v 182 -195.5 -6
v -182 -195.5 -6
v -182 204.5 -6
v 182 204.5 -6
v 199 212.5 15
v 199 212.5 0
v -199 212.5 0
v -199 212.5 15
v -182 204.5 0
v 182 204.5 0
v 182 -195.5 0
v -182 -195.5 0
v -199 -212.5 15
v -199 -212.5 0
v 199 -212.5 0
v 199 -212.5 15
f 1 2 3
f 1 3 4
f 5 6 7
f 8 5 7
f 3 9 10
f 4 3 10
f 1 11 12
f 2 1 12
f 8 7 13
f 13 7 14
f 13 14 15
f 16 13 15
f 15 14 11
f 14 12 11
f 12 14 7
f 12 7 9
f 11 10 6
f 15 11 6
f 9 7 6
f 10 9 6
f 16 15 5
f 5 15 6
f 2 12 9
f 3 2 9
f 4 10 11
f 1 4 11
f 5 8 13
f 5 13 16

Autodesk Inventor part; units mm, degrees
ref_plane "YZ Plane" through (0, 0, 0) normal (1, 0, 0) x (0, 1, 0)
ref_plane "XZ Plane" through (0, 0, 0) normal (0, 1, 0) x (-1, 0, 0)
ref_plane "XY Plane" through (0, 0, 0) normal (0, 0, 1) x (1, 0, 0)
sketch "Skizze1" plane through (0, 0, 0) normal (0, 0, 1) x (1, 0, 0)
  line L0 (-199, -212.5) -> (199, -212.5)
  line L1 (199, -212.5) -> (199, 212.5)
  line L2 (199, 212.5) -> (-199, 212.5)
  line L3 (-199, 212.5) -> (-199, -212.5)
  line L4 (-199, -212.5) -> (199, 212.5) construction
  line L5 (199, -212.5) -> (-199, 212.5) construction
  line L6 (182, -195.5) -> (-182, -195.5)
  line L7 (-182, -195.5) -> (-182, 204.5)
  line L8 (-182, 204.5) -> (182, 204.5)
  line L9 (182, 204.5) -> (182, -195.5)
  line L10 (182, -195.5) -> (-182, 204.5) construction
  line L11 (-182, -195.5) -> (182, 204.5) construction
  point P0 (0, 0)
  dimension "d0" = 398
  dimension "d1" = 425
  dimension "d5" = 17
  dimension "d8" = 17
  dimension "d9" = 17
  dimension "d10" = 8
extrude "Extrusion1" add sketch "Skizze1" along normal blind 15 contours L3 L2 L1 L0 | L6 L7 L8 L9
extrude "Extrusion2" add sketch "Skizze1" against normal blind 6 contours L6 L7 L8 L9
equation "\"d0\" = case_width - 2 * gap_air"
equation "\"d2\" = inner_thickness"
equation "\"d6\" = mdf_thickness"
equation "\"kg_thickness\" = 4.9"
equation "\"ht_thickness\" = 1.9"
equation "\"case_thickness\" = 18"
equation "\"inner_thickness\" = 15"
equation "\"gap_fit\" = 0.1"
equation "\"gap_slide\" = 0.2"
equation "\"gap_air\" = 1"
equation "\"bore_diameter\" = 73"
equation "\"mdf_thickness\" = 6"
equation "\"tape_width\" = 15"
equation "\"tape_thickness\" = 3"
equation "\"inner_depth\" = 255"
equation "\"case_width\" = 400"
properties part number "Front_Staubfach"
